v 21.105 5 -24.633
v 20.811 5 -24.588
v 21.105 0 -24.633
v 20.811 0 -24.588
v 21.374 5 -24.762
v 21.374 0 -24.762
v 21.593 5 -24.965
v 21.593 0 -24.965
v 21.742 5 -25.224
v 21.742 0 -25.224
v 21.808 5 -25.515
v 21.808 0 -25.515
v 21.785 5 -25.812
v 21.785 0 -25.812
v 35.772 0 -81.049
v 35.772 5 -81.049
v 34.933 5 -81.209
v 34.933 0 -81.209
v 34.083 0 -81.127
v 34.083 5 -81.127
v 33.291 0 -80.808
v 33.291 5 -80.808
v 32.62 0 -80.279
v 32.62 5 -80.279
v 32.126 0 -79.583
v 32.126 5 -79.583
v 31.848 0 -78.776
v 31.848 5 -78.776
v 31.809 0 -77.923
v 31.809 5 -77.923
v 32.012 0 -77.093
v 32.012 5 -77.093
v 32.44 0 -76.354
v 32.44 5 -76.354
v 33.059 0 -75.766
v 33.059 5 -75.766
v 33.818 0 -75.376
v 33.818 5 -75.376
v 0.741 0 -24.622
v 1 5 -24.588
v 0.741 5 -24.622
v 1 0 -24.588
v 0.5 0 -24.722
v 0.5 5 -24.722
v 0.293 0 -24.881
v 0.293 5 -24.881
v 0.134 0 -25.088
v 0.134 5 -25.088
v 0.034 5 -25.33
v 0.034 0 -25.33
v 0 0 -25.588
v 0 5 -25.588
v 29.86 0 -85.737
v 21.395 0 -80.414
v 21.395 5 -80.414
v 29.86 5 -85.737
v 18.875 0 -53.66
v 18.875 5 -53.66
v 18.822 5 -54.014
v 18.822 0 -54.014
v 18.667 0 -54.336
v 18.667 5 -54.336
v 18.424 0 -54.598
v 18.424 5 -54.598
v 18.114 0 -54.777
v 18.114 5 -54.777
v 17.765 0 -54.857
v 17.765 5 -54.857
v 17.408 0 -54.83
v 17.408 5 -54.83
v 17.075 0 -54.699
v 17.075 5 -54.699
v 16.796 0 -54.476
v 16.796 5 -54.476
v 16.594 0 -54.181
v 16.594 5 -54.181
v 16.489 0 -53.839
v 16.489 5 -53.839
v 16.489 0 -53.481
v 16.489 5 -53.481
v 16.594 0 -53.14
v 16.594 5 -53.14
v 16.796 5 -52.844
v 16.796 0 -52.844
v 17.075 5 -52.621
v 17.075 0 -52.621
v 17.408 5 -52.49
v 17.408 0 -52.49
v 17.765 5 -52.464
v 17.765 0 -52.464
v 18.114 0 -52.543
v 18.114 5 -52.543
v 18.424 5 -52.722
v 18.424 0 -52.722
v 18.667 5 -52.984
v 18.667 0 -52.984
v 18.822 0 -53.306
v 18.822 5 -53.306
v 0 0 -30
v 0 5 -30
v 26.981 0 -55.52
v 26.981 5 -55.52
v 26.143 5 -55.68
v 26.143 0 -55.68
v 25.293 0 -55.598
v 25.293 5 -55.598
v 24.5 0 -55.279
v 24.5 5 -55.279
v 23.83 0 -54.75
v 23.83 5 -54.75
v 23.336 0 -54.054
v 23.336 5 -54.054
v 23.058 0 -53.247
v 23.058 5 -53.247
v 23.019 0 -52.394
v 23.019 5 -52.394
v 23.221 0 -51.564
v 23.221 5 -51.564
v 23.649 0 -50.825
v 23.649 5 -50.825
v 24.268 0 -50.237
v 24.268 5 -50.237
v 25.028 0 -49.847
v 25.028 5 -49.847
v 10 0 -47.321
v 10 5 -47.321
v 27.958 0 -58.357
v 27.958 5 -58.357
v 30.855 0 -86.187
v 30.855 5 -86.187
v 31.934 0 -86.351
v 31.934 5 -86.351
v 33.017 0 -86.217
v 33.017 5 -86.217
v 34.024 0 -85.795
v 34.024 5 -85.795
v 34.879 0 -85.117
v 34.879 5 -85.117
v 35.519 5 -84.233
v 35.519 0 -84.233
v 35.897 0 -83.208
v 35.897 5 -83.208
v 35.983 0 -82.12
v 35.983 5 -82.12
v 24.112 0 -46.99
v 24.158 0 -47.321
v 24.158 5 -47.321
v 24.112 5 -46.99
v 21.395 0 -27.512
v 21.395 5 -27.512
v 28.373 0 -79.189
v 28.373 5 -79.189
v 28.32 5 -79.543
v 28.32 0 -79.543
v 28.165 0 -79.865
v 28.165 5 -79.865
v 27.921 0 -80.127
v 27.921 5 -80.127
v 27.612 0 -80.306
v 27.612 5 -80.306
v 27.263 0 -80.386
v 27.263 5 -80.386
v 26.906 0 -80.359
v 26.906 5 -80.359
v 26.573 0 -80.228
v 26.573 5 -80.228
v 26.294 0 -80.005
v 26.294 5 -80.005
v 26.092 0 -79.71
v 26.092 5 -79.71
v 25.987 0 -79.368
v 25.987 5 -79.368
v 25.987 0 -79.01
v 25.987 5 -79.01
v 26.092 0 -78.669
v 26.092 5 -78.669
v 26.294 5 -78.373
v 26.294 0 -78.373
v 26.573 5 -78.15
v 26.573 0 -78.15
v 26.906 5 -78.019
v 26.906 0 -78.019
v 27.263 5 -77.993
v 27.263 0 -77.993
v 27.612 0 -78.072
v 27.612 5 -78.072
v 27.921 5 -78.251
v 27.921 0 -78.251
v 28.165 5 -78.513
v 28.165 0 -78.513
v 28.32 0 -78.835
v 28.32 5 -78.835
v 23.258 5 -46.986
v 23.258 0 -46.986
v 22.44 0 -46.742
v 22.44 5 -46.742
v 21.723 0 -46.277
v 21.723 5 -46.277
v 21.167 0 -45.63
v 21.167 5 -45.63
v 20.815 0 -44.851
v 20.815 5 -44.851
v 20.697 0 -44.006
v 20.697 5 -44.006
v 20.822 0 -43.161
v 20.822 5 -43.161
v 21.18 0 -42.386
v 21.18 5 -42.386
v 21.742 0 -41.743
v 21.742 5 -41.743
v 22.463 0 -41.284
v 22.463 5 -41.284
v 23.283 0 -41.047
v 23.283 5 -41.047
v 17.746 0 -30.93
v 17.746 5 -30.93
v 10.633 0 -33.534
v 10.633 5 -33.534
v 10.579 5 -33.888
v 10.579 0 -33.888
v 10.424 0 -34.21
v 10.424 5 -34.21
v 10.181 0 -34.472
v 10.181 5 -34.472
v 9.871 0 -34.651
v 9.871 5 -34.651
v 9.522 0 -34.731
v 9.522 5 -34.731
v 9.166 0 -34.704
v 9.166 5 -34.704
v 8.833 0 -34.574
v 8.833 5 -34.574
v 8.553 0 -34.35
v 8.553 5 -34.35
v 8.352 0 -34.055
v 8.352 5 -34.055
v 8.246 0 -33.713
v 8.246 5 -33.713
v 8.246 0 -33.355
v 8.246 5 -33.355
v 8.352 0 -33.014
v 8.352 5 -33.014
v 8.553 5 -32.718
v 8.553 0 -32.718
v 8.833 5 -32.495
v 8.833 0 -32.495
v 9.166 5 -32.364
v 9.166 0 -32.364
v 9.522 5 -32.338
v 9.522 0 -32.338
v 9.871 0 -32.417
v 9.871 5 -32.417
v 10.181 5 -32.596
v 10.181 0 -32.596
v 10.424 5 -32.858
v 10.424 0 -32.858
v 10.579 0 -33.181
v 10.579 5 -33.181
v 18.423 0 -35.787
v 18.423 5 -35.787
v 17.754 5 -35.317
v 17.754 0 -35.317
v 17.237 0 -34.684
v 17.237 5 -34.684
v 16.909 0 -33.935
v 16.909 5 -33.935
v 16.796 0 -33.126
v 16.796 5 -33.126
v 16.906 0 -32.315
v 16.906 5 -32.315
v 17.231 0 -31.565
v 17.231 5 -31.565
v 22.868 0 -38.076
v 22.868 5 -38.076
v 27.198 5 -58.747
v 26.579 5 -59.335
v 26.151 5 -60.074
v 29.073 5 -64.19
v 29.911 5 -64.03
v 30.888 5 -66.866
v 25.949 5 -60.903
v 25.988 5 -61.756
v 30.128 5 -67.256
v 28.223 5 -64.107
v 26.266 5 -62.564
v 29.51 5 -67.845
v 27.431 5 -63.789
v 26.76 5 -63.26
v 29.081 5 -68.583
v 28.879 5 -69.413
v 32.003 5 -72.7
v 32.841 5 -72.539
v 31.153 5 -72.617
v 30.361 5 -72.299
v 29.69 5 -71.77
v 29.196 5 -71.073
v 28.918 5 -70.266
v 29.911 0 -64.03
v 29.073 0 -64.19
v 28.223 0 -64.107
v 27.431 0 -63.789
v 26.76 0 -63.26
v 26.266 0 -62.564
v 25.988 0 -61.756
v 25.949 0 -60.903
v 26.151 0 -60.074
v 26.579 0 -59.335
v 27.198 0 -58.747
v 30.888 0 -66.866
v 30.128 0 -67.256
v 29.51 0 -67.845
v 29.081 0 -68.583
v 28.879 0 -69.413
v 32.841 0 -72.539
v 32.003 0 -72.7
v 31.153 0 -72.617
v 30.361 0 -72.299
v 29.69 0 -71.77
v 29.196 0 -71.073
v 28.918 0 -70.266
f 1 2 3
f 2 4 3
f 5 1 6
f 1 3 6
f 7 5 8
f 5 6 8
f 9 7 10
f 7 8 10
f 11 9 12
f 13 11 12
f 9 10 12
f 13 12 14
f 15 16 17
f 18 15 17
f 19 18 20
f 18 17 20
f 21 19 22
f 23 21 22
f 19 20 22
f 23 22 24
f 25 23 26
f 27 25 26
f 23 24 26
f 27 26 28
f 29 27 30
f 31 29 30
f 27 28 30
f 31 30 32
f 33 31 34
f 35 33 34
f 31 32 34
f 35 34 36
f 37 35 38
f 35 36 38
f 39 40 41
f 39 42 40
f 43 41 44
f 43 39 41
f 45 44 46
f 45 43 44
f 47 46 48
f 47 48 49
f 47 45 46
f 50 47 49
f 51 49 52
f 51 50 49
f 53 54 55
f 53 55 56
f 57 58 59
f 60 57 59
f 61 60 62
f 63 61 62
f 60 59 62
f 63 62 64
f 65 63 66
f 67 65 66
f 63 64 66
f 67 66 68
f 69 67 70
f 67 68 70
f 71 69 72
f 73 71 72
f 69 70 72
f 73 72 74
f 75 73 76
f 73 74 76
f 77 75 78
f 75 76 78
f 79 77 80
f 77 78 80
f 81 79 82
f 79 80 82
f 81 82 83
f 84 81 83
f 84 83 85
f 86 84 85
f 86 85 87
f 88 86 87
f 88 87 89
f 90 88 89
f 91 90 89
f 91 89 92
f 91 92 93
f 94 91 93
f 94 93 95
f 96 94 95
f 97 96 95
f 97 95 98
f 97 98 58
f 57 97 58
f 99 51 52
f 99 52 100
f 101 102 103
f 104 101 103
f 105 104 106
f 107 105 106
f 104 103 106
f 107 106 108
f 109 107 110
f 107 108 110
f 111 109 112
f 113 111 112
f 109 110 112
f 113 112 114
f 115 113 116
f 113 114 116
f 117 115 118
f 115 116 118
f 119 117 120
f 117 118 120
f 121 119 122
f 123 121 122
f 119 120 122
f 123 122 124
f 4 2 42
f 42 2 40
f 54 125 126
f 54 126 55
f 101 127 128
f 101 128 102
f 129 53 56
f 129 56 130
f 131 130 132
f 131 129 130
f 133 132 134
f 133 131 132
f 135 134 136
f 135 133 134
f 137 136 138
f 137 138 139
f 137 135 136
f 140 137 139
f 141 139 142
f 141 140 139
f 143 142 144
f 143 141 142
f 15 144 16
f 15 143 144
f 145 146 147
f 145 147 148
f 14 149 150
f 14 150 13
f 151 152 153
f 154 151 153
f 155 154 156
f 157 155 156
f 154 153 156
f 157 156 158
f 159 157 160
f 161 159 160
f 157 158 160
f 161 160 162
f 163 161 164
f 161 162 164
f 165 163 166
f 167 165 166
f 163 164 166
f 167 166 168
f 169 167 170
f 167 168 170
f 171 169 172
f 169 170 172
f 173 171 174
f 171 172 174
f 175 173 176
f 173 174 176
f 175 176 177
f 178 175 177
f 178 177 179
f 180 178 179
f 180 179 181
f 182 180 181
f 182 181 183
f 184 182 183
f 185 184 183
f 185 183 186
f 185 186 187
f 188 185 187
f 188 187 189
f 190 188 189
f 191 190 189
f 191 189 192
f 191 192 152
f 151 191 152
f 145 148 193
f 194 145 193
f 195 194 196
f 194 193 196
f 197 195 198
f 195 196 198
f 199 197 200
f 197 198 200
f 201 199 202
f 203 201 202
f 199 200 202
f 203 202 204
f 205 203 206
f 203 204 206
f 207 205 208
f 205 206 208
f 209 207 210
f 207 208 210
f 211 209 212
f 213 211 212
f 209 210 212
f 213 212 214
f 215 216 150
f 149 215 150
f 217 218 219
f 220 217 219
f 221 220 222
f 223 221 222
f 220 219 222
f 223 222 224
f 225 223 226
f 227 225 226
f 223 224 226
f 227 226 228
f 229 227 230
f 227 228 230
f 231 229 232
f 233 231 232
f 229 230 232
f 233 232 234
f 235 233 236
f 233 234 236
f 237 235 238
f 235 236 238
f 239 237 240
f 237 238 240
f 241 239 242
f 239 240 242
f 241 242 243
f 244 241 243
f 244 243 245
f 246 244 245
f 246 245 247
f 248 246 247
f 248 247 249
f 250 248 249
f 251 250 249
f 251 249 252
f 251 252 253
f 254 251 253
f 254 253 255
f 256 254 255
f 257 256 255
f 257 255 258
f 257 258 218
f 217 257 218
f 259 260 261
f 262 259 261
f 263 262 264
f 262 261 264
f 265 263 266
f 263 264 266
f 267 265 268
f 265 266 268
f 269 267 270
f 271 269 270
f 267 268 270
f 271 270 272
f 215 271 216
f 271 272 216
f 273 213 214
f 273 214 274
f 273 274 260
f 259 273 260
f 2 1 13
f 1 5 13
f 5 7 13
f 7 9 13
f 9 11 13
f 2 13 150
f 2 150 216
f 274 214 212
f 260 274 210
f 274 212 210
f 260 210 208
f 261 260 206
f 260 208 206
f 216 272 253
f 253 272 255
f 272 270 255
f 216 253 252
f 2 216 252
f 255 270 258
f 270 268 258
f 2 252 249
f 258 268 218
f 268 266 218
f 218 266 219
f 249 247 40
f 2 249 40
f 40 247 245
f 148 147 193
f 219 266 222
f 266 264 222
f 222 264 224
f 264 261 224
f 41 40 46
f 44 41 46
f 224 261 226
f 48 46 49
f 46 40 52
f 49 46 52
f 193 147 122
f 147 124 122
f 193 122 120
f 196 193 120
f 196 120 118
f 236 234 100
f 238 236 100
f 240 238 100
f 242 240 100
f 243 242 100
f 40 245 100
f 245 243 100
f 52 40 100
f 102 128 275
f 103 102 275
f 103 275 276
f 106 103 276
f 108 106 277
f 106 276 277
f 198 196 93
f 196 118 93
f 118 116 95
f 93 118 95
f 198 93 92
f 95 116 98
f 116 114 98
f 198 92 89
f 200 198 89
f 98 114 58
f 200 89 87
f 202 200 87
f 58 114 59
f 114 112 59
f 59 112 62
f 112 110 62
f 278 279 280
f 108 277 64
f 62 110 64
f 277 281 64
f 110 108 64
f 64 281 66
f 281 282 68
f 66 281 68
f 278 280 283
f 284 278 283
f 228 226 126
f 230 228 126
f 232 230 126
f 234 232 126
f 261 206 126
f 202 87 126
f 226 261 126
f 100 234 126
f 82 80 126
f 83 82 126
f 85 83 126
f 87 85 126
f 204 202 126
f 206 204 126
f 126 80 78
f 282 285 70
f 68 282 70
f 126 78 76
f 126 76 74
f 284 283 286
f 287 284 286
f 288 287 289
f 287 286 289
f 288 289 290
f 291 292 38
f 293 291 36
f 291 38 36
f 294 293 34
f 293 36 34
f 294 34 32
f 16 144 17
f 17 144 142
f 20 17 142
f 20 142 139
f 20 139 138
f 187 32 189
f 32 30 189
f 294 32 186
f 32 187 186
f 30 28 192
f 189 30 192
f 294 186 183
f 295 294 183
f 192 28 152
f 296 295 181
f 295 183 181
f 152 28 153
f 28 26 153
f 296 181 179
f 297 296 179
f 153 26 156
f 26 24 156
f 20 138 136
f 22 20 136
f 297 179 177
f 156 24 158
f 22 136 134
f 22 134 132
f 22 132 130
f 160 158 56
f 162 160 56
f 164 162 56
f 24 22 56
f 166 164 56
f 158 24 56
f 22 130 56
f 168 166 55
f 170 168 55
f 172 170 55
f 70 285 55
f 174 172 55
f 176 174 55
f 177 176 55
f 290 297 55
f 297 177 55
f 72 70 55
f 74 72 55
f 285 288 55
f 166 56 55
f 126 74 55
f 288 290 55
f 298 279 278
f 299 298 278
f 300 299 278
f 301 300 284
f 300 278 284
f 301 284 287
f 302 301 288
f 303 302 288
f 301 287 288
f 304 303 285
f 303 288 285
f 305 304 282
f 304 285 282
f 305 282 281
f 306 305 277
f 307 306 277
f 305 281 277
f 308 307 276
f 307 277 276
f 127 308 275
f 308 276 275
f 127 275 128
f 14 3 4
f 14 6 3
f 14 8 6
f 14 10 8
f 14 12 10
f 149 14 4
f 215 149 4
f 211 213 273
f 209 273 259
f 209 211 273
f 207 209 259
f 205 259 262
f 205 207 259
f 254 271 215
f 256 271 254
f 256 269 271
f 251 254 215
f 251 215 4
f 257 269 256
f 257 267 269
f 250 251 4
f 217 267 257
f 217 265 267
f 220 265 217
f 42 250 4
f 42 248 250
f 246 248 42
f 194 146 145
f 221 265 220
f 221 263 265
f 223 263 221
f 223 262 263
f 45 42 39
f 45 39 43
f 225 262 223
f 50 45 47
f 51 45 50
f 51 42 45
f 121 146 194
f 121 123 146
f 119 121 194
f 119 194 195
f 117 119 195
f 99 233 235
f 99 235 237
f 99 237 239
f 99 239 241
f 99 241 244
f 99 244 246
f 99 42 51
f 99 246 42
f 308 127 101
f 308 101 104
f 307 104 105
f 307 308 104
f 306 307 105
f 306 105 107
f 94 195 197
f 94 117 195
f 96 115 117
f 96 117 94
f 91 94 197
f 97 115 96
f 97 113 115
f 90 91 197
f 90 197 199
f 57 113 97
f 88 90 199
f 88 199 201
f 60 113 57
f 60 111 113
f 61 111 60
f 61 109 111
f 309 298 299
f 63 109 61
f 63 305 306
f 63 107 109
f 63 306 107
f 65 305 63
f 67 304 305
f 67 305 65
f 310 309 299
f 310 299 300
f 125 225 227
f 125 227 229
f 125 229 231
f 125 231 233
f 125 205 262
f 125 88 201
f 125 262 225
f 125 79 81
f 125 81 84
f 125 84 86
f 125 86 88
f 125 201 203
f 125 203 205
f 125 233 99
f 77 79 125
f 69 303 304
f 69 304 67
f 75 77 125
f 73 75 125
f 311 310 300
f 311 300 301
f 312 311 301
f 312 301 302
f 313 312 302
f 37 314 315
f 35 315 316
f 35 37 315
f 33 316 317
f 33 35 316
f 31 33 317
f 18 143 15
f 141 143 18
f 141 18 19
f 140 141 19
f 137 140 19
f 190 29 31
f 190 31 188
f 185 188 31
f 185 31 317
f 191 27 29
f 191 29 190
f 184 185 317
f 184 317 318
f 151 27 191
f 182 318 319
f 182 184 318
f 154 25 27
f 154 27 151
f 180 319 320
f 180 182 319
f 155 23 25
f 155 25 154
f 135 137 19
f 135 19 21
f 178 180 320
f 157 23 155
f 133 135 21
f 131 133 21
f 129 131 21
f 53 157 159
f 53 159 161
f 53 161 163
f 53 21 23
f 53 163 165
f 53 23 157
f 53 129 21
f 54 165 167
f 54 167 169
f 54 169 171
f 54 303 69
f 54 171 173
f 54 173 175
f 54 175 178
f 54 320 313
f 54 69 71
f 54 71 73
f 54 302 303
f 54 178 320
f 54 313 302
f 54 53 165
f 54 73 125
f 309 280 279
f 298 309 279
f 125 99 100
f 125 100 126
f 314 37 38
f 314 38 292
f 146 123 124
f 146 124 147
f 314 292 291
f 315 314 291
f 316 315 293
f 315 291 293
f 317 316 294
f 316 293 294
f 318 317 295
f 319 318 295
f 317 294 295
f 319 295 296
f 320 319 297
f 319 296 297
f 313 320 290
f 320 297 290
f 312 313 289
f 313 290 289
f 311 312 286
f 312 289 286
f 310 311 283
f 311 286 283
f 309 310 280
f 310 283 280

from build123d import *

# Parameters (mm, degrees)
BOSS_EXTRUDE1_DEPTH = 5
TEETH_CUTOUT_DEPTH  = 6
FILLET2_R           = 0.5
SKETCH3_R           = 1.2
HOLE_CUTOUT_DEPTH   = 6
CUT_EXTRUDE1_DEPTH  = 6
FILLET3_R           = 1


with BuildPart() as part:
    # Sketch1 → Boss-Extrude1 (new body)
    with BuildSketch(Plane(origin=(0, 0, 0), x_dir=(1, 0, 0), z_dir=(0, 1, 0))):
        with BuildLine():
            Line((0, 0), (0, 30))
            Line((0, 30), (10, 47.320508076))
            Line((10, 47.320508076), (21.394885406, 80.413658222))
            Line((21.394885406, 80.413658222), (29.86, 85.73736322))
            ThreePointArc((29.86, 85.73736322), (34.475009673, 85.485348682), (35.771556302, 81.049044765))
            Line((35.771556302, 81.049044765), (24.157889764, 47.320508076))
            Line((24.157889764, 47.320508076), (21.394885406, 27.512282337))
            Line((21.394885406, 27.512282337), (27.71, 0))
            Line((27.71, 0), (0, 0))
        make_face()
    extrude(amount=BOSS_EXTRUDE1_DEPTH)

    # Sketch2 → Teeth_Cutout (cut, through all)
    with BuildSketch(Plane(origin=(0, 5, 0), x_dir=(1, 0, 0), z_dir=(0, 1, 0))):
        with BuildLine():
            ThreePointArc((35.771556302, 81.049044765), (31.958296112, 79.189193501), (33.818147375, 75.375933311))
            Line((33.818147375, 75.375933311), (35.771556302, 81.049044765))
        make_face()
        with BuildLine():
            ThreePointArc((32.841442912, 72.539377584), (29.028182721, 70.679526321), (30.888033985, 66.866266131))
            Line((30.888033985, 66.866266131), (32.841442912, 72.539377584))
        make_face()
        with BuildLine():
            ThreePointArc((29.911329522, 64.029710404), (26.098069331, 62.16985914), (27.957920595, 58.35659895))
            Line((27.957920595, 58.35659895), (29.911329522, 64.029710404))
        make_face()
        with BuildLine():
            ThreePointArc((26.981216131, 55.520043223), (23.167955941, 53.66019196), (25.027807205, 49.84693177))
            Line((25.027807205, 49.84693177), (26.981216131, 55.520043223))
        make_face()
        with BuildLine():
            ThreePointArc((24.111726827, 46.989561847), (20.726042313, 44.43277864), (23.28282552, 41.047094125))
            Line((23.28282552, 41.047094125), (24.111726827, 46.989561847))
        make_face()
        with BuildLine():
            Line((17.745535287, 30.930212077), (21.394885406, 27.512282337))
            Line((21.394885406, 27.512282337), (22.868374866, 38.075860265))
            Line((22.868374866, 38.075860265), (18.423003833, 35.787044768))
            ThreePointArc((18.423003833, 35.787044768), (16.82505927, 33.534272802), (17.745535287, 30.930212077))
        make_face()
        with BuildLine():
            Line((19.827305771, 16.086577823), (24.453138026, 14.188769628))
            Line((24.453138026, 14.188769628), (22.066045454, 24.588321976))
            Line((22.066045454, 24.588321976), (18.730897185, 20.863166138))
            ThreePointArc((18.730897185, 20.863166138), (18.042030328, 18.190917128), (19.827305771, 16.086577823))
        make_face()
        with BuildLine():
            Line((22.885558392, 2.763065114), (27.511390647, 0.865256919))
            Line((27.511390647, 0.865256919), (25.124298075, 11.264809267))
            Line((25.124298075, 11.264809267), (21.789149806, 7.539653429))
            ThreePointArc((21.789149806, 7.539653429), (21.100282948, 4.867404419), (22.885558392, 2.763065114))
        make_face()
    extrude(amount=-TEETH_CUTOUT_DEPTH, mode=Mode.SUBTRACT)

    # Fillet2
    fillet2_edges = [part.edges().sort_by_distance(p)[0] for p in [
        (27.71, 2.5, 0),
        (27.511390647, 2.5, -0.865256919),
    ]]
    fillet(fillet2_edges, radius=FILLET2_R)

    # Sketch3 → Hole_Cutout (cut, through all)
    with BuildSketch(Plane(origin=(0, 5, 0), x_dir=(1, 0, 0), z_dir=(0, 1, 0))):
        with Locations((11.72836197, 9.402231348)):
            Circle(SKETCH3_R)
        with Locations((9.432786312, 33.534272802)):
            Circle(SKETCH3_R)
        with Locations((17.675442081, 53.66019196)):
            Circle(SKETCH3_R)
        with Locations((27.173268391, 79.189193501)):
            Circle(SKETCH3_R)
    extrude(amount=-HOLE_CUTOUT_DEPTH, mode=Mode.SUBTRACT)

    # Sketch4 → Cut-Extrude1 (cut, through all)
    with BuildSketch(Plane(origin=(0, 5, 0), x_dir=(1, 0, 0), z_dir=(0, 1, 0))):
        Polygon((22.066045454, 24.588321976), (0, 24.588321976), (0, 0), (28.614713262, 0), (28.614713262, 24.588321976), align=None)
    extrude(amount=-CUT_EXTRUDE1_DEPTH, mode=Mode.SUBTRACT)

    # Fillet3
    fillet3_edges = [part.edges().sort_by_distance(p)[0] for p in [
        (0, 2.5, -24.588321976),
        (22.066045454, 2.5, -24.588321976),
    ]]
    fillet(fillet3_edges, radius=FILLET3_R)


solid = part.part
